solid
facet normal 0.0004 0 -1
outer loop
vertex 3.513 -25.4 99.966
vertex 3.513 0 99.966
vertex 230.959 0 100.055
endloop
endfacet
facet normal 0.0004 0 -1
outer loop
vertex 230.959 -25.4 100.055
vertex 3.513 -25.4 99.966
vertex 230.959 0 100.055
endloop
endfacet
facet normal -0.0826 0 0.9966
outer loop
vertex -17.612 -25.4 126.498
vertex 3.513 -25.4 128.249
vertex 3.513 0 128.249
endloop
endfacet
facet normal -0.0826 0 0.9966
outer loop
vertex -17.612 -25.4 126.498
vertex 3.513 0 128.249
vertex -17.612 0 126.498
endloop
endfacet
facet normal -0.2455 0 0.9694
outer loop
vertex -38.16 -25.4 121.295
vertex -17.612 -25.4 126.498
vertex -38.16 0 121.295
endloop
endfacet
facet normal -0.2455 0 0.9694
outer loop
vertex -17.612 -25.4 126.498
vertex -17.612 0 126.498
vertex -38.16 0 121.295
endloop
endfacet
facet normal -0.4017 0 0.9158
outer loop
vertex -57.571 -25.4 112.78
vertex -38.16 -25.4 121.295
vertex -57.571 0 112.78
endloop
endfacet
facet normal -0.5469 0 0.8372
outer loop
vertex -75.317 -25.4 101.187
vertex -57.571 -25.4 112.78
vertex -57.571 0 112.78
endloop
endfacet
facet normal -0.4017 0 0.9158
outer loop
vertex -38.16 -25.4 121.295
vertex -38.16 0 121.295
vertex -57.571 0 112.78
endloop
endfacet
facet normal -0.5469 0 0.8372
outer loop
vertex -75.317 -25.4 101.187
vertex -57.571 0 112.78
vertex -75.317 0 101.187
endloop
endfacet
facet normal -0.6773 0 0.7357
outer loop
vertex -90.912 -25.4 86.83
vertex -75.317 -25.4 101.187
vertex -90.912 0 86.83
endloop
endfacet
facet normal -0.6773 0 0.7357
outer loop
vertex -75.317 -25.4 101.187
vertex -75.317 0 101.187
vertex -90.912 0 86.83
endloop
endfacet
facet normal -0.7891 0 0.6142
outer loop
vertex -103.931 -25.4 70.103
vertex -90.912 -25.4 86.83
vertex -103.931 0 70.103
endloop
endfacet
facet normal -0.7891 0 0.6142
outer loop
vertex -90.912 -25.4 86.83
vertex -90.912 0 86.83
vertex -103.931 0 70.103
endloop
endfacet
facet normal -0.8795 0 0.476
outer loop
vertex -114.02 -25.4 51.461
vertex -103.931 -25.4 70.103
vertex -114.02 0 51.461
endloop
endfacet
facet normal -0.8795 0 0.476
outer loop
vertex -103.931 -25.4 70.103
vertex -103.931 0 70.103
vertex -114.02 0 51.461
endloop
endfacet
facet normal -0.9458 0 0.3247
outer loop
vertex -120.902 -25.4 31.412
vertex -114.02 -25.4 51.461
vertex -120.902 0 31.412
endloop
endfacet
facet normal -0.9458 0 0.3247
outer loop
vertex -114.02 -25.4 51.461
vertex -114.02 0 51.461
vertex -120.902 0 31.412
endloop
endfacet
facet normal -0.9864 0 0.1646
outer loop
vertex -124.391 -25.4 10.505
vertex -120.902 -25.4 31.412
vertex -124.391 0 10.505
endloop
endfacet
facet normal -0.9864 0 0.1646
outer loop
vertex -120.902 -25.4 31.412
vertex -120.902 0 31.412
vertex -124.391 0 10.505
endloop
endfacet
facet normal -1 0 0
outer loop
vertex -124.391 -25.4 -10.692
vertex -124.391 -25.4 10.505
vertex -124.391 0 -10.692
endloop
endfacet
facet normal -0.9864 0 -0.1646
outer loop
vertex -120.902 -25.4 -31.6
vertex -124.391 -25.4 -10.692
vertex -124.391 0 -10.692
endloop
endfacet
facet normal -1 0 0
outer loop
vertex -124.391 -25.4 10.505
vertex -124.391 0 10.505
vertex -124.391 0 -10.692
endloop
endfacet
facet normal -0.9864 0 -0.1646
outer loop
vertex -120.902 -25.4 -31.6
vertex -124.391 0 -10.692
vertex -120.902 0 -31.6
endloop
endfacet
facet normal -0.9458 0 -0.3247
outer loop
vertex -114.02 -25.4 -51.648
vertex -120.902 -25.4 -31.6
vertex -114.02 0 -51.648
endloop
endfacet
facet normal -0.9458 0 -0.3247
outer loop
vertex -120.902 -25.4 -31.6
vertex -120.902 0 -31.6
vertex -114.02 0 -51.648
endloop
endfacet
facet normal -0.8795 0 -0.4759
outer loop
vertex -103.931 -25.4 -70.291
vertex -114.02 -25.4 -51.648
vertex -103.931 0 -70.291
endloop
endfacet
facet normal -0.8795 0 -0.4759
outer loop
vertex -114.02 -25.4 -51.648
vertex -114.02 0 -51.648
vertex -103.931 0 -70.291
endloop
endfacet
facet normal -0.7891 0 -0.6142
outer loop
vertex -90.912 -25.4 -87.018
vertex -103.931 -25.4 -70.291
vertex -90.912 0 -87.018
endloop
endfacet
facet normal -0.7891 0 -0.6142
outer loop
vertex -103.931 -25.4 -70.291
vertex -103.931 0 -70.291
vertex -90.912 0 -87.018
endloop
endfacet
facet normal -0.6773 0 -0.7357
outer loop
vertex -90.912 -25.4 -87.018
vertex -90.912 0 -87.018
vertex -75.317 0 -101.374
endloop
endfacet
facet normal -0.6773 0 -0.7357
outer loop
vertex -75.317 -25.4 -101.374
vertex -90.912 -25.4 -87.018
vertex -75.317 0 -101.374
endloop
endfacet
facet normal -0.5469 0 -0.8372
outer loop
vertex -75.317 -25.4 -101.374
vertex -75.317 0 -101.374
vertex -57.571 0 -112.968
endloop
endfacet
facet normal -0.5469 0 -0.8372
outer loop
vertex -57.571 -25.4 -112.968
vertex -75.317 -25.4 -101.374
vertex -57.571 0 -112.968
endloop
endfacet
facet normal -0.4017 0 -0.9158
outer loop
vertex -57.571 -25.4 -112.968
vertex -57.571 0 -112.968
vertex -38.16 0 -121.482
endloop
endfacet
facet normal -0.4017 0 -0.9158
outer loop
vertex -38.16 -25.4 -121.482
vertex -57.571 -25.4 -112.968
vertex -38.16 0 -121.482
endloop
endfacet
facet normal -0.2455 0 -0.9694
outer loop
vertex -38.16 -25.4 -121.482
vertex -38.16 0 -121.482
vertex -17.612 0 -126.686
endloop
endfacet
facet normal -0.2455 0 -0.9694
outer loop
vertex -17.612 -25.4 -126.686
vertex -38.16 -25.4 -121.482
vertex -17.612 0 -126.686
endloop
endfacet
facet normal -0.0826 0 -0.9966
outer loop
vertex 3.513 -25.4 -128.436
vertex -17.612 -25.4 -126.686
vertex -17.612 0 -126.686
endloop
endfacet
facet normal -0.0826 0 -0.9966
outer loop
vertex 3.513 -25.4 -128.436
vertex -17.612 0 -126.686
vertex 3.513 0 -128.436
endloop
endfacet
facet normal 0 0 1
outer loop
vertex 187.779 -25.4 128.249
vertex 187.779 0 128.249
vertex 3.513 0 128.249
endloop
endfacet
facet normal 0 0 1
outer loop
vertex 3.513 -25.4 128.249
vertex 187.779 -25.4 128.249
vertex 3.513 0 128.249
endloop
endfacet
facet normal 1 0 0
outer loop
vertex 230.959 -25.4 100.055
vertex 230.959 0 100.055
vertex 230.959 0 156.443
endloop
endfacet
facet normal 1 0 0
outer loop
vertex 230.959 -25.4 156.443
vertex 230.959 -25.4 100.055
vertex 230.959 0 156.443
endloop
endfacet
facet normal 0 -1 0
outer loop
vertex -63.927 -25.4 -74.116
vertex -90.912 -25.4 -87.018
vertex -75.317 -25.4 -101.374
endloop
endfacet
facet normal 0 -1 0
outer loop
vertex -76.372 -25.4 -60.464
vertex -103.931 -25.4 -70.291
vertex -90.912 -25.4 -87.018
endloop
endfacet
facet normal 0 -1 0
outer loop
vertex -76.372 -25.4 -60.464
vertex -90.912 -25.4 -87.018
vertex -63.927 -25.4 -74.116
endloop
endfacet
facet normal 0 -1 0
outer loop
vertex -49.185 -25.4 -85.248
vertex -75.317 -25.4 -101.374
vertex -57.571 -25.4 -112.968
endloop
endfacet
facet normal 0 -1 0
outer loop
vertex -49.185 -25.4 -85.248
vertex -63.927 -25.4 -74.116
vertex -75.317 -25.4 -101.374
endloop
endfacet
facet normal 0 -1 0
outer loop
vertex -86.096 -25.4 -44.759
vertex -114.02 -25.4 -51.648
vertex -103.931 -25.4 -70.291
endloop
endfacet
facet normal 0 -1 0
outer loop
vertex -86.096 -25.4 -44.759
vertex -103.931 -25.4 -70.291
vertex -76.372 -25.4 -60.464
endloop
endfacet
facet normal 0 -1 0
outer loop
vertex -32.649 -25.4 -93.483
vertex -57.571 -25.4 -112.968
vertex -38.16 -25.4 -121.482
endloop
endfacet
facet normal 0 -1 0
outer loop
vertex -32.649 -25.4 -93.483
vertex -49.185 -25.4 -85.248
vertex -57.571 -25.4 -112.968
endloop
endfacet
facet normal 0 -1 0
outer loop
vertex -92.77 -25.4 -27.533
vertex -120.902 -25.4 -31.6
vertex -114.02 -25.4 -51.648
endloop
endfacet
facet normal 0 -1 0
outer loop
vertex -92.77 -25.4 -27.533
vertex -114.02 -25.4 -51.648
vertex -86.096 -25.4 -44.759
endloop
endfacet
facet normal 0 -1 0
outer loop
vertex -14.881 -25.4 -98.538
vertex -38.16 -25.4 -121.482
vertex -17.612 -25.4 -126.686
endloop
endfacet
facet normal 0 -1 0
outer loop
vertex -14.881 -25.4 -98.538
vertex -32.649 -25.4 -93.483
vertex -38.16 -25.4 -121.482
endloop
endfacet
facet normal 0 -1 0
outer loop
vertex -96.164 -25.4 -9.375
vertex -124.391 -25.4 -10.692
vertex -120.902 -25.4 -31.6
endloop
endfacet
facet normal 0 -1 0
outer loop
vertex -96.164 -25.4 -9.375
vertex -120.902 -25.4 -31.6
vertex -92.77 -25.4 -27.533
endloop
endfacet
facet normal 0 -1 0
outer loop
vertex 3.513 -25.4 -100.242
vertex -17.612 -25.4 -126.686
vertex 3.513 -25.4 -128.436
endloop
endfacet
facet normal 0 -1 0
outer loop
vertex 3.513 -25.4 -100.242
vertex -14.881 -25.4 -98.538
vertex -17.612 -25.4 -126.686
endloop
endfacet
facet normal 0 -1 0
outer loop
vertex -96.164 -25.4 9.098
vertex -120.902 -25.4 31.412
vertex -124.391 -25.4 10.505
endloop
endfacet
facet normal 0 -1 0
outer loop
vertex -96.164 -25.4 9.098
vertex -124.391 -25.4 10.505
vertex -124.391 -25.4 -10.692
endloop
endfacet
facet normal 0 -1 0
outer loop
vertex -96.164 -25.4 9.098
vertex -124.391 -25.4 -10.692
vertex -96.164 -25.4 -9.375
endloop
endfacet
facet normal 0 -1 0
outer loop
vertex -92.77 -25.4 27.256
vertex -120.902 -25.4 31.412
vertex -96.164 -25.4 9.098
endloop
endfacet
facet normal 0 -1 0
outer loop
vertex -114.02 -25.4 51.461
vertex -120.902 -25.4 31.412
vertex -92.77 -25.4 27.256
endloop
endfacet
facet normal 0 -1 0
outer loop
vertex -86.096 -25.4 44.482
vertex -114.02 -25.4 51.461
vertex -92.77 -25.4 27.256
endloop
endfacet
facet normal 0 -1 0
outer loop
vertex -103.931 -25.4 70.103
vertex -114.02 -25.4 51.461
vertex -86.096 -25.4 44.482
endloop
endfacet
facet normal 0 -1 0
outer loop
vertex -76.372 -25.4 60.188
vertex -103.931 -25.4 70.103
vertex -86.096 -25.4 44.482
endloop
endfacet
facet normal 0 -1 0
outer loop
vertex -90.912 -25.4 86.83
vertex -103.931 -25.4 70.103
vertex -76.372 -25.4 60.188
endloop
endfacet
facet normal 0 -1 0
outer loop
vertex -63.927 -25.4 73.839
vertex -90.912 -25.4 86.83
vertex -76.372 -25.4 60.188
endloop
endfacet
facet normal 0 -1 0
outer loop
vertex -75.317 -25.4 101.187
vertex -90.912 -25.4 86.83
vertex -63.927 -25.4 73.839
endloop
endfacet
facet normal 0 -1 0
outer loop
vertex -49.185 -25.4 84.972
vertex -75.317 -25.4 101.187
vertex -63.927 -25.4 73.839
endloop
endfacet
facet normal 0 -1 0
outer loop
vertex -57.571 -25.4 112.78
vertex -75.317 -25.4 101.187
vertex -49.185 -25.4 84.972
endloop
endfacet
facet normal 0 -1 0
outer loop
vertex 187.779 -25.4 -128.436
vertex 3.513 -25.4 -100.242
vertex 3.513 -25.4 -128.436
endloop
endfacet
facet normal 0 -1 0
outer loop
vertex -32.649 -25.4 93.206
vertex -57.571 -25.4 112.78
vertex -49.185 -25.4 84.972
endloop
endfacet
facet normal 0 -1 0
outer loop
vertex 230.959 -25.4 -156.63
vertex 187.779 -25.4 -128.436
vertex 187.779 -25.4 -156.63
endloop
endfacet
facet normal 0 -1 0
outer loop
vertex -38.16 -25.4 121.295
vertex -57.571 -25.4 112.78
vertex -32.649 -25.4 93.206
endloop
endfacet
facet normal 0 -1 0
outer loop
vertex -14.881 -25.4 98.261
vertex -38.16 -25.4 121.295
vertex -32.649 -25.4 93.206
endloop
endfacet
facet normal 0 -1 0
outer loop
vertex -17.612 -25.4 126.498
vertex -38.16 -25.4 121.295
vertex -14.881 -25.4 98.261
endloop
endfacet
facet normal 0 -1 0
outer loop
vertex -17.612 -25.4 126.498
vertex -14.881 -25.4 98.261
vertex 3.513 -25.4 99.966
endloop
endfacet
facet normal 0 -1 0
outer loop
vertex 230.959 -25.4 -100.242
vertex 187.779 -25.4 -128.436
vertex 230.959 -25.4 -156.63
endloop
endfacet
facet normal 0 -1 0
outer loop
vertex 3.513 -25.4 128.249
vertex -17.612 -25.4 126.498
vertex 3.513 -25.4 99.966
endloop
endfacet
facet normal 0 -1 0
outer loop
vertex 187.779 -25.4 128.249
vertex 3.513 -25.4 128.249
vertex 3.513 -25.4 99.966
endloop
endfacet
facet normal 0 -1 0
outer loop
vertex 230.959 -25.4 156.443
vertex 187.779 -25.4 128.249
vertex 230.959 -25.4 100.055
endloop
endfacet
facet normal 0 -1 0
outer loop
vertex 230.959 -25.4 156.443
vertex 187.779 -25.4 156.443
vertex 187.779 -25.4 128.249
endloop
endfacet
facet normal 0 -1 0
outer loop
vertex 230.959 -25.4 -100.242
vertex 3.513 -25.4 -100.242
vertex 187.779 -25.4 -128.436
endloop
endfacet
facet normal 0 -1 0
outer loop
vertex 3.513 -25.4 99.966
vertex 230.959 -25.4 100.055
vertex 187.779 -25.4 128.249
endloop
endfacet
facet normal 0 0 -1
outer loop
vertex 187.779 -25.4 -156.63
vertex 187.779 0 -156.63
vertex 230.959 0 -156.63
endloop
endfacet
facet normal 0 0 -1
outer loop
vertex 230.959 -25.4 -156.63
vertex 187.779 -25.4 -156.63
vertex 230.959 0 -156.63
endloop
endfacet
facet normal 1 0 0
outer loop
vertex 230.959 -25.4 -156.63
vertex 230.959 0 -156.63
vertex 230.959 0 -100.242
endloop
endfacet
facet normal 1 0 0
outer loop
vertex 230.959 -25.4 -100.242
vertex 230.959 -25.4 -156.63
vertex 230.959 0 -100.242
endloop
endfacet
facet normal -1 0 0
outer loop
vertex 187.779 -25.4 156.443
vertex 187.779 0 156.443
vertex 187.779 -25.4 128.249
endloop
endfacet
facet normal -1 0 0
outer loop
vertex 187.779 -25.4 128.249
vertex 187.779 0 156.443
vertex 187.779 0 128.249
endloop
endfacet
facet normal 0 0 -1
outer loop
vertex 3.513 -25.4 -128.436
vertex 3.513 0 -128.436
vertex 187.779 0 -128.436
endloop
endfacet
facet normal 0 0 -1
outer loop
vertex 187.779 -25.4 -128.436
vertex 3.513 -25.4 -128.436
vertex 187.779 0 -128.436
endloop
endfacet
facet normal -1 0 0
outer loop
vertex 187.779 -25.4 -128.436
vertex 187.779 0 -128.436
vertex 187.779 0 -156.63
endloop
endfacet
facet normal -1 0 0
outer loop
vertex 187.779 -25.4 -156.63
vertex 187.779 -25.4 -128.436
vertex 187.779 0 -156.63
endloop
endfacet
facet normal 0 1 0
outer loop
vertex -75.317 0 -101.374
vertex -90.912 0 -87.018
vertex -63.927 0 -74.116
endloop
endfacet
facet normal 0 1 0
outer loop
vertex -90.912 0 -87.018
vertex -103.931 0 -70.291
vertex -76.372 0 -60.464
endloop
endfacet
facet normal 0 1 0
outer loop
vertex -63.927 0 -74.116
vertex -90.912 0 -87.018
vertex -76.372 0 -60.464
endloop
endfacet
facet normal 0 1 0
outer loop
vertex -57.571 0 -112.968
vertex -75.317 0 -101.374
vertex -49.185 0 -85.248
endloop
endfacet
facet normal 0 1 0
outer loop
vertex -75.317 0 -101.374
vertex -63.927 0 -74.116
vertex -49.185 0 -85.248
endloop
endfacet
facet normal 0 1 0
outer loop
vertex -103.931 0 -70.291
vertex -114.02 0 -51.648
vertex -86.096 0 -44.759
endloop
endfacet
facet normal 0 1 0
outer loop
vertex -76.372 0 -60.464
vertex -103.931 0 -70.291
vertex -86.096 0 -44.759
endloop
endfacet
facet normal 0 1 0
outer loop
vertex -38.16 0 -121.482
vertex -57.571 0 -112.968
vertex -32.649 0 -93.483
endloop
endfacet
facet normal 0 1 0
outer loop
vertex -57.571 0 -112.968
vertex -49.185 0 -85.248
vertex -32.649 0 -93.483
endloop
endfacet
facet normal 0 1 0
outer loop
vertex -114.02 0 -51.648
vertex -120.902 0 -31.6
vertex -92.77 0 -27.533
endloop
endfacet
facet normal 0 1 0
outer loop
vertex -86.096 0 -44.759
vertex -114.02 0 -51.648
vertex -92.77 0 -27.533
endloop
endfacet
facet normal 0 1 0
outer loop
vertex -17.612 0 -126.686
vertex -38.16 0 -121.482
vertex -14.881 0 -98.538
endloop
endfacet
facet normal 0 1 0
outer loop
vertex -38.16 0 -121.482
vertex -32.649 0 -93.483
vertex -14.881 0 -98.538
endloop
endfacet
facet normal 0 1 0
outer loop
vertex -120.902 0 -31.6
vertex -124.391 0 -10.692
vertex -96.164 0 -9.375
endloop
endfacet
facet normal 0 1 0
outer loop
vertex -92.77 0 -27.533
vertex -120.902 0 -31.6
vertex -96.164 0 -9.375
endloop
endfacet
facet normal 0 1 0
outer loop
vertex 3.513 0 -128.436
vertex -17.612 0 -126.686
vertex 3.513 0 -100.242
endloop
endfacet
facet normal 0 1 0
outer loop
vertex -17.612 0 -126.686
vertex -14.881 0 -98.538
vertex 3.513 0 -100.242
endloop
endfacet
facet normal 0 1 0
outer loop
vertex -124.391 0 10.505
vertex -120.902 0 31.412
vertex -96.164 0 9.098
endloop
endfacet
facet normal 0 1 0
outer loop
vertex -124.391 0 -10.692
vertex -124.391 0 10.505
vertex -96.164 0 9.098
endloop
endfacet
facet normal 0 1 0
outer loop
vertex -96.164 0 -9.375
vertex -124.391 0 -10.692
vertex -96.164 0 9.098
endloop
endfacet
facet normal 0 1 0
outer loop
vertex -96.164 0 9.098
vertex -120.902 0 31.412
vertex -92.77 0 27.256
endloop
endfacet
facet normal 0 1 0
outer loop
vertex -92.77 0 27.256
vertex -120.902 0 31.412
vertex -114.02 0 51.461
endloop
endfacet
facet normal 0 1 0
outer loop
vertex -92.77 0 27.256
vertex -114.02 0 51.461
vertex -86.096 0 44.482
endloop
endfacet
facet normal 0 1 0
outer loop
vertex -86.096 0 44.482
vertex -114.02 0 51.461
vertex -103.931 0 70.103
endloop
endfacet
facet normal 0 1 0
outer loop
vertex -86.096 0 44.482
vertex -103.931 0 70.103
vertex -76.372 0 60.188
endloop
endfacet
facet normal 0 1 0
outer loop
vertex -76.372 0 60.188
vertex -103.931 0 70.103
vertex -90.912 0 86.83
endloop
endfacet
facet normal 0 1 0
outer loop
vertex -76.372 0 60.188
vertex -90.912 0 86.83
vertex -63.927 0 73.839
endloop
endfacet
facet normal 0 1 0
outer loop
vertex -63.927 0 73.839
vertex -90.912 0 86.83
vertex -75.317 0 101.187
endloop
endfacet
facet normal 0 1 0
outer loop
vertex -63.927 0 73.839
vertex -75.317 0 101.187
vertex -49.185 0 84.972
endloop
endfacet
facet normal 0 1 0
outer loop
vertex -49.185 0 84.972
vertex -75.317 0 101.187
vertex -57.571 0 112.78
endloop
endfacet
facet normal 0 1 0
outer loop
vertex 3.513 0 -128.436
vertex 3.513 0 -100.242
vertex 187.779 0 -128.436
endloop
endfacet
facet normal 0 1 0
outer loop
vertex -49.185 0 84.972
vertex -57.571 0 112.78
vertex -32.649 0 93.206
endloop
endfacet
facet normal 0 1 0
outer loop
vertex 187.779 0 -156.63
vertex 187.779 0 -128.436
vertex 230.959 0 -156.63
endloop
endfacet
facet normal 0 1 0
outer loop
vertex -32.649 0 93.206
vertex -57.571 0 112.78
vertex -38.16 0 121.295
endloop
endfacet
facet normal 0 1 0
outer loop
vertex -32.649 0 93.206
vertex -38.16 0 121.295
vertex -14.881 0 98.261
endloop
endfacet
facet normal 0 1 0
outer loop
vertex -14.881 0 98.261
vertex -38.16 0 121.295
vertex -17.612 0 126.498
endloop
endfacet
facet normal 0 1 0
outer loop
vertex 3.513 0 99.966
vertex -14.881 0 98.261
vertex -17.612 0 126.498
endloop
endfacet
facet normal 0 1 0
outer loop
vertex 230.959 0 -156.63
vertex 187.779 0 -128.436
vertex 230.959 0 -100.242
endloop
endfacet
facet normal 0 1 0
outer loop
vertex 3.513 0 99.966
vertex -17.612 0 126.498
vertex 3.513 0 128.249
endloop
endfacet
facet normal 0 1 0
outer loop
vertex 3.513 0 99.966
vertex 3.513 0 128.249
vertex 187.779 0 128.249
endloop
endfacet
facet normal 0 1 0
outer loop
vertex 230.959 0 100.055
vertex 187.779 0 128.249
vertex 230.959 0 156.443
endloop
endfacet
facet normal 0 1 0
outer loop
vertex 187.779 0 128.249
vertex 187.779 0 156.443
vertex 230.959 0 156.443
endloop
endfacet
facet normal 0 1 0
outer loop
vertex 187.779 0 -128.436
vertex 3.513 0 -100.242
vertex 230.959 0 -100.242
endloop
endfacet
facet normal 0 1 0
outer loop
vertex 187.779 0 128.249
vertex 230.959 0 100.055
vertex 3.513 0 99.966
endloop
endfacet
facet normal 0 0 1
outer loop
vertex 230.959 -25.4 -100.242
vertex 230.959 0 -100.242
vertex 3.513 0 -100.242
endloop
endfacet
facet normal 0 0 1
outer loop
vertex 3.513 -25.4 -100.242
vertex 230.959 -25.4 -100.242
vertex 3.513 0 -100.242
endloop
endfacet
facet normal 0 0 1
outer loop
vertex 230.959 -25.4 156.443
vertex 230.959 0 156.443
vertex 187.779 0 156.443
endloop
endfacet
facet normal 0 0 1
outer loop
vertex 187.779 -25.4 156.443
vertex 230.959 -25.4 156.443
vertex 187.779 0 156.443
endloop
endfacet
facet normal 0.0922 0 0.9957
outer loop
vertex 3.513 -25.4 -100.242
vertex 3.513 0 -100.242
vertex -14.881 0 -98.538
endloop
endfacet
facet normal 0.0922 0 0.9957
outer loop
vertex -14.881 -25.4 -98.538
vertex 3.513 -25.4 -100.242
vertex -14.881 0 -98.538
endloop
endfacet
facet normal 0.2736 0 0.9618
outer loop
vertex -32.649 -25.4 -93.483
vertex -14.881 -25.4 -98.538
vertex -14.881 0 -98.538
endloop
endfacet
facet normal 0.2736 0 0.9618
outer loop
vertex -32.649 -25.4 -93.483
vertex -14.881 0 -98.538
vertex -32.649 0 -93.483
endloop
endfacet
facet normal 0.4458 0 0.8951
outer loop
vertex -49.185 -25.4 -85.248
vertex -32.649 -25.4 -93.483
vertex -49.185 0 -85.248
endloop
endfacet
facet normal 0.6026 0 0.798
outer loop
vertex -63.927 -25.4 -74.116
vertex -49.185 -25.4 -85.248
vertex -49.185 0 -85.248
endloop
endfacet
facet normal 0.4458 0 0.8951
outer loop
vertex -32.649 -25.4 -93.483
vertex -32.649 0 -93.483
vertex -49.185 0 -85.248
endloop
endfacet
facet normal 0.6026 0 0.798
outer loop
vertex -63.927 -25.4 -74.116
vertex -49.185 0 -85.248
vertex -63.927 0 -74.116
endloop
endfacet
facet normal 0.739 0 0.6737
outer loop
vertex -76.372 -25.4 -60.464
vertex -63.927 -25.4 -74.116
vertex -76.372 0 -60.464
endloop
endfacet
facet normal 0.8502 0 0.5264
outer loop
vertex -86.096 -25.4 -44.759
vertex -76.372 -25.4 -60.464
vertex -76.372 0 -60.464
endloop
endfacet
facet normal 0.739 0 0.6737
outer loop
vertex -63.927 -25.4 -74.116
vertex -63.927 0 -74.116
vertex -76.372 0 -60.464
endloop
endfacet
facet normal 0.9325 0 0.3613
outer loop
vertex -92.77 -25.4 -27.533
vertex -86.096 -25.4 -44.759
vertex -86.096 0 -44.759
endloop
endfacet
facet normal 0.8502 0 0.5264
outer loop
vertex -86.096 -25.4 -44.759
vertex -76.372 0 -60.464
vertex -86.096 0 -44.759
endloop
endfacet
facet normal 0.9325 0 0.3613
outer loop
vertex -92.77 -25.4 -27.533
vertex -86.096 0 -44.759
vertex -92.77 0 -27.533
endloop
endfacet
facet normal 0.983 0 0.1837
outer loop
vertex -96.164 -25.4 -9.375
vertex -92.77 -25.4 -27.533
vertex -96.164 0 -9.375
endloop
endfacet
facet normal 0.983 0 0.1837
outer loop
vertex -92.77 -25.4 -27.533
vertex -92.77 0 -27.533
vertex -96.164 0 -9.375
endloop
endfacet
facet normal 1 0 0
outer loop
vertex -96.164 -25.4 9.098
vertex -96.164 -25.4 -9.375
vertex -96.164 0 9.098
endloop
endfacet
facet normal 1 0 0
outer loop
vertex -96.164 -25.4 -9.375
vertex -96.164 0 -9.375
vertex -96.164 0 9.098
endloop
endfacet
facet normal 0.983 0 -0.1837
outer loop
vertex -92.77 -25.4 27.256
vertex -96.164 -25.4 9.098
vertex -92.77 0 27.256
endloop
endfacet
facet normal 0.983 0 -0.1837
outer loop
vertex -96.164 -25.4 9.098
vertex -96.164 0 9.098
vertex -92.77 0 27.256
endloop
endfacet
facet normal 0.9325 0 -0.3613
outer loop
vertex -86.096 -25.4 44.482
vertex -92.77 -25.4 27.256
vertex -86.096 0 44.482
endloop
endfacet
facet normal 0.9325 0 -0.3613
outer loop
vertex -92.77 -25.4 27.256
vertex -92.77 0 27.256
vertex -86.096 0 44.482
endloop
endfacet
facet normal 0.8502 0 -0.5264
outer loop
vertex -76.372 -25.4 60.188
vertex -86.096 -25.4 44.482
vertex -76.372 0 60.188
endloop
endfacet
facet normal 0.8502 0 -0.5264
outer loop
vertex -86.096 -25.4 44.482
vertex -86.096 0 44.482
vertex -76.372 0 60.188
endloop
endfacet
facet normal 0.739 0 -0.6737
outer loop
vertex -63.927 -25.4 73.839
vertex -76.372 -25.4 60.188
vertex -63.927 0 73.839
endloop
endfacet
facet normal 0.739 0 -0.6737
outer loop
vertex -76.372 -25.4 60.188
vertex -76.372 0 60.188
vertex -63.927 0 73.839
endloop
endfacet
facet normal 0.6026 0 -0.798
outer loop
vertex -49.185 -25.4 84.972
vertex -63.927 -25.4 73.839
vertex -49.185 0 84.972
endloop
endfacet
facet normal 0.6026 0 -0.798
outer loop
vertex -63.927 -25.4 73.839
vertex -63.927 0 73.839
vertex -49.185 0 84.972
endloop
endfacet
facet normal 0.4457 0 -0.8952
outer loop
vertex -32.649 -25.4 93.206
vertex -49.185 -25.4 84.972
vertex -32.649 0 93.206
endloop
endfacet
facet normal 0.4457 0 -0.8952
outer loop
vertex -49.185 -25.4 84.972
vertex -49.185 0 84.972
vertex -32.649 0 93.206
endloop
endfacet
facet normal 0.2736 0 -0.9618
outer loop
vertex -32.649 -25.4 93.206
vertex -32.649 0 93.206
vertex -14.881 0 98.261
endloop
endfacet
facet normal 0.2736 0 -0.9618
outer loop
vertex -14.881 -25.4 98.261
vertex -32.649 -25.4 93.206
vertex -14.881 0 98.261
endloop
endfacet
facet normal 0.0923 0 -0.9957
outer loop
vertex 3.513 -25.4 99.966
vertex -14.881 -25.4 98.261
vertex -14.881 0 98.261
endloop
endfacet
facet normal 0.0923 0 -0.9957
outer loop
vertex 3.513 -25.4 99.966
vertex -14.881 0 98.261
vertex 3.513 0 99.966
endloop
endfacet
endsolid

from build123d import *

# Parameters (mm, degrees)
F1_DEPTH = 25.4


# Not quite as in the source:
# - a feature names something its author has since deleted; it is built from what else it names


with BuildPart() as f1:
    # F0 (on Front) → F1 (new body)
    with BuildSketch(Plane.XZ):
        with BuildLine():
            ThreePointArc((3.5129496086, 128.2487611501), (-124.8295958309, -0.0937842894), (3.5129496086, -128.4363297289))
            Line((3.5129496086, -128.4363297289), (187.7788752317, -128.4363297289))
            Line((187.7788752317, -128.4363297289), (187.7788752317, -156.6303297289))
            Line((187.7788752317, -156.6303297289), (230.9588752317, -156.6303297289))
            Line((230.9588752317, -156.6303297289), (230.9588752317, -128.4363297289))
            Line((230.9588752317, -128.4363297289), (230.9588752317, -100.2423297289))
            Line((230.9588752317, -100.2423297289), (3.5129496086, -100.2423297289))
            ThreePointArc((3.5129496086, -100.2423297289), (-96.5909865333, -0.138393587), (3.5129496086, 99.9655425549))
            Line((3.5129496086, 99.9655425549), (230.9588752317, 100.0547611501))
            Line((230.9588752317, 100.0547611501), (230.9588752317, 128.2487611501))
            Line((230.9588752317, 128.2487611501), (230.9588752317, 156.4427611501))
            Line((230.9588752317, 156.4427611501), (187.7788752317, 156.4427611501))
            Line((187.7788752317, 156.4427611501), (187.7788752317, 128.2487611501))
            Line((187.7788752317, 128.2487611501), (3.5129496086, 128.2487611501))
        make_face()
    extrude(amount=F1_DEPTH)


solid = f1.part
